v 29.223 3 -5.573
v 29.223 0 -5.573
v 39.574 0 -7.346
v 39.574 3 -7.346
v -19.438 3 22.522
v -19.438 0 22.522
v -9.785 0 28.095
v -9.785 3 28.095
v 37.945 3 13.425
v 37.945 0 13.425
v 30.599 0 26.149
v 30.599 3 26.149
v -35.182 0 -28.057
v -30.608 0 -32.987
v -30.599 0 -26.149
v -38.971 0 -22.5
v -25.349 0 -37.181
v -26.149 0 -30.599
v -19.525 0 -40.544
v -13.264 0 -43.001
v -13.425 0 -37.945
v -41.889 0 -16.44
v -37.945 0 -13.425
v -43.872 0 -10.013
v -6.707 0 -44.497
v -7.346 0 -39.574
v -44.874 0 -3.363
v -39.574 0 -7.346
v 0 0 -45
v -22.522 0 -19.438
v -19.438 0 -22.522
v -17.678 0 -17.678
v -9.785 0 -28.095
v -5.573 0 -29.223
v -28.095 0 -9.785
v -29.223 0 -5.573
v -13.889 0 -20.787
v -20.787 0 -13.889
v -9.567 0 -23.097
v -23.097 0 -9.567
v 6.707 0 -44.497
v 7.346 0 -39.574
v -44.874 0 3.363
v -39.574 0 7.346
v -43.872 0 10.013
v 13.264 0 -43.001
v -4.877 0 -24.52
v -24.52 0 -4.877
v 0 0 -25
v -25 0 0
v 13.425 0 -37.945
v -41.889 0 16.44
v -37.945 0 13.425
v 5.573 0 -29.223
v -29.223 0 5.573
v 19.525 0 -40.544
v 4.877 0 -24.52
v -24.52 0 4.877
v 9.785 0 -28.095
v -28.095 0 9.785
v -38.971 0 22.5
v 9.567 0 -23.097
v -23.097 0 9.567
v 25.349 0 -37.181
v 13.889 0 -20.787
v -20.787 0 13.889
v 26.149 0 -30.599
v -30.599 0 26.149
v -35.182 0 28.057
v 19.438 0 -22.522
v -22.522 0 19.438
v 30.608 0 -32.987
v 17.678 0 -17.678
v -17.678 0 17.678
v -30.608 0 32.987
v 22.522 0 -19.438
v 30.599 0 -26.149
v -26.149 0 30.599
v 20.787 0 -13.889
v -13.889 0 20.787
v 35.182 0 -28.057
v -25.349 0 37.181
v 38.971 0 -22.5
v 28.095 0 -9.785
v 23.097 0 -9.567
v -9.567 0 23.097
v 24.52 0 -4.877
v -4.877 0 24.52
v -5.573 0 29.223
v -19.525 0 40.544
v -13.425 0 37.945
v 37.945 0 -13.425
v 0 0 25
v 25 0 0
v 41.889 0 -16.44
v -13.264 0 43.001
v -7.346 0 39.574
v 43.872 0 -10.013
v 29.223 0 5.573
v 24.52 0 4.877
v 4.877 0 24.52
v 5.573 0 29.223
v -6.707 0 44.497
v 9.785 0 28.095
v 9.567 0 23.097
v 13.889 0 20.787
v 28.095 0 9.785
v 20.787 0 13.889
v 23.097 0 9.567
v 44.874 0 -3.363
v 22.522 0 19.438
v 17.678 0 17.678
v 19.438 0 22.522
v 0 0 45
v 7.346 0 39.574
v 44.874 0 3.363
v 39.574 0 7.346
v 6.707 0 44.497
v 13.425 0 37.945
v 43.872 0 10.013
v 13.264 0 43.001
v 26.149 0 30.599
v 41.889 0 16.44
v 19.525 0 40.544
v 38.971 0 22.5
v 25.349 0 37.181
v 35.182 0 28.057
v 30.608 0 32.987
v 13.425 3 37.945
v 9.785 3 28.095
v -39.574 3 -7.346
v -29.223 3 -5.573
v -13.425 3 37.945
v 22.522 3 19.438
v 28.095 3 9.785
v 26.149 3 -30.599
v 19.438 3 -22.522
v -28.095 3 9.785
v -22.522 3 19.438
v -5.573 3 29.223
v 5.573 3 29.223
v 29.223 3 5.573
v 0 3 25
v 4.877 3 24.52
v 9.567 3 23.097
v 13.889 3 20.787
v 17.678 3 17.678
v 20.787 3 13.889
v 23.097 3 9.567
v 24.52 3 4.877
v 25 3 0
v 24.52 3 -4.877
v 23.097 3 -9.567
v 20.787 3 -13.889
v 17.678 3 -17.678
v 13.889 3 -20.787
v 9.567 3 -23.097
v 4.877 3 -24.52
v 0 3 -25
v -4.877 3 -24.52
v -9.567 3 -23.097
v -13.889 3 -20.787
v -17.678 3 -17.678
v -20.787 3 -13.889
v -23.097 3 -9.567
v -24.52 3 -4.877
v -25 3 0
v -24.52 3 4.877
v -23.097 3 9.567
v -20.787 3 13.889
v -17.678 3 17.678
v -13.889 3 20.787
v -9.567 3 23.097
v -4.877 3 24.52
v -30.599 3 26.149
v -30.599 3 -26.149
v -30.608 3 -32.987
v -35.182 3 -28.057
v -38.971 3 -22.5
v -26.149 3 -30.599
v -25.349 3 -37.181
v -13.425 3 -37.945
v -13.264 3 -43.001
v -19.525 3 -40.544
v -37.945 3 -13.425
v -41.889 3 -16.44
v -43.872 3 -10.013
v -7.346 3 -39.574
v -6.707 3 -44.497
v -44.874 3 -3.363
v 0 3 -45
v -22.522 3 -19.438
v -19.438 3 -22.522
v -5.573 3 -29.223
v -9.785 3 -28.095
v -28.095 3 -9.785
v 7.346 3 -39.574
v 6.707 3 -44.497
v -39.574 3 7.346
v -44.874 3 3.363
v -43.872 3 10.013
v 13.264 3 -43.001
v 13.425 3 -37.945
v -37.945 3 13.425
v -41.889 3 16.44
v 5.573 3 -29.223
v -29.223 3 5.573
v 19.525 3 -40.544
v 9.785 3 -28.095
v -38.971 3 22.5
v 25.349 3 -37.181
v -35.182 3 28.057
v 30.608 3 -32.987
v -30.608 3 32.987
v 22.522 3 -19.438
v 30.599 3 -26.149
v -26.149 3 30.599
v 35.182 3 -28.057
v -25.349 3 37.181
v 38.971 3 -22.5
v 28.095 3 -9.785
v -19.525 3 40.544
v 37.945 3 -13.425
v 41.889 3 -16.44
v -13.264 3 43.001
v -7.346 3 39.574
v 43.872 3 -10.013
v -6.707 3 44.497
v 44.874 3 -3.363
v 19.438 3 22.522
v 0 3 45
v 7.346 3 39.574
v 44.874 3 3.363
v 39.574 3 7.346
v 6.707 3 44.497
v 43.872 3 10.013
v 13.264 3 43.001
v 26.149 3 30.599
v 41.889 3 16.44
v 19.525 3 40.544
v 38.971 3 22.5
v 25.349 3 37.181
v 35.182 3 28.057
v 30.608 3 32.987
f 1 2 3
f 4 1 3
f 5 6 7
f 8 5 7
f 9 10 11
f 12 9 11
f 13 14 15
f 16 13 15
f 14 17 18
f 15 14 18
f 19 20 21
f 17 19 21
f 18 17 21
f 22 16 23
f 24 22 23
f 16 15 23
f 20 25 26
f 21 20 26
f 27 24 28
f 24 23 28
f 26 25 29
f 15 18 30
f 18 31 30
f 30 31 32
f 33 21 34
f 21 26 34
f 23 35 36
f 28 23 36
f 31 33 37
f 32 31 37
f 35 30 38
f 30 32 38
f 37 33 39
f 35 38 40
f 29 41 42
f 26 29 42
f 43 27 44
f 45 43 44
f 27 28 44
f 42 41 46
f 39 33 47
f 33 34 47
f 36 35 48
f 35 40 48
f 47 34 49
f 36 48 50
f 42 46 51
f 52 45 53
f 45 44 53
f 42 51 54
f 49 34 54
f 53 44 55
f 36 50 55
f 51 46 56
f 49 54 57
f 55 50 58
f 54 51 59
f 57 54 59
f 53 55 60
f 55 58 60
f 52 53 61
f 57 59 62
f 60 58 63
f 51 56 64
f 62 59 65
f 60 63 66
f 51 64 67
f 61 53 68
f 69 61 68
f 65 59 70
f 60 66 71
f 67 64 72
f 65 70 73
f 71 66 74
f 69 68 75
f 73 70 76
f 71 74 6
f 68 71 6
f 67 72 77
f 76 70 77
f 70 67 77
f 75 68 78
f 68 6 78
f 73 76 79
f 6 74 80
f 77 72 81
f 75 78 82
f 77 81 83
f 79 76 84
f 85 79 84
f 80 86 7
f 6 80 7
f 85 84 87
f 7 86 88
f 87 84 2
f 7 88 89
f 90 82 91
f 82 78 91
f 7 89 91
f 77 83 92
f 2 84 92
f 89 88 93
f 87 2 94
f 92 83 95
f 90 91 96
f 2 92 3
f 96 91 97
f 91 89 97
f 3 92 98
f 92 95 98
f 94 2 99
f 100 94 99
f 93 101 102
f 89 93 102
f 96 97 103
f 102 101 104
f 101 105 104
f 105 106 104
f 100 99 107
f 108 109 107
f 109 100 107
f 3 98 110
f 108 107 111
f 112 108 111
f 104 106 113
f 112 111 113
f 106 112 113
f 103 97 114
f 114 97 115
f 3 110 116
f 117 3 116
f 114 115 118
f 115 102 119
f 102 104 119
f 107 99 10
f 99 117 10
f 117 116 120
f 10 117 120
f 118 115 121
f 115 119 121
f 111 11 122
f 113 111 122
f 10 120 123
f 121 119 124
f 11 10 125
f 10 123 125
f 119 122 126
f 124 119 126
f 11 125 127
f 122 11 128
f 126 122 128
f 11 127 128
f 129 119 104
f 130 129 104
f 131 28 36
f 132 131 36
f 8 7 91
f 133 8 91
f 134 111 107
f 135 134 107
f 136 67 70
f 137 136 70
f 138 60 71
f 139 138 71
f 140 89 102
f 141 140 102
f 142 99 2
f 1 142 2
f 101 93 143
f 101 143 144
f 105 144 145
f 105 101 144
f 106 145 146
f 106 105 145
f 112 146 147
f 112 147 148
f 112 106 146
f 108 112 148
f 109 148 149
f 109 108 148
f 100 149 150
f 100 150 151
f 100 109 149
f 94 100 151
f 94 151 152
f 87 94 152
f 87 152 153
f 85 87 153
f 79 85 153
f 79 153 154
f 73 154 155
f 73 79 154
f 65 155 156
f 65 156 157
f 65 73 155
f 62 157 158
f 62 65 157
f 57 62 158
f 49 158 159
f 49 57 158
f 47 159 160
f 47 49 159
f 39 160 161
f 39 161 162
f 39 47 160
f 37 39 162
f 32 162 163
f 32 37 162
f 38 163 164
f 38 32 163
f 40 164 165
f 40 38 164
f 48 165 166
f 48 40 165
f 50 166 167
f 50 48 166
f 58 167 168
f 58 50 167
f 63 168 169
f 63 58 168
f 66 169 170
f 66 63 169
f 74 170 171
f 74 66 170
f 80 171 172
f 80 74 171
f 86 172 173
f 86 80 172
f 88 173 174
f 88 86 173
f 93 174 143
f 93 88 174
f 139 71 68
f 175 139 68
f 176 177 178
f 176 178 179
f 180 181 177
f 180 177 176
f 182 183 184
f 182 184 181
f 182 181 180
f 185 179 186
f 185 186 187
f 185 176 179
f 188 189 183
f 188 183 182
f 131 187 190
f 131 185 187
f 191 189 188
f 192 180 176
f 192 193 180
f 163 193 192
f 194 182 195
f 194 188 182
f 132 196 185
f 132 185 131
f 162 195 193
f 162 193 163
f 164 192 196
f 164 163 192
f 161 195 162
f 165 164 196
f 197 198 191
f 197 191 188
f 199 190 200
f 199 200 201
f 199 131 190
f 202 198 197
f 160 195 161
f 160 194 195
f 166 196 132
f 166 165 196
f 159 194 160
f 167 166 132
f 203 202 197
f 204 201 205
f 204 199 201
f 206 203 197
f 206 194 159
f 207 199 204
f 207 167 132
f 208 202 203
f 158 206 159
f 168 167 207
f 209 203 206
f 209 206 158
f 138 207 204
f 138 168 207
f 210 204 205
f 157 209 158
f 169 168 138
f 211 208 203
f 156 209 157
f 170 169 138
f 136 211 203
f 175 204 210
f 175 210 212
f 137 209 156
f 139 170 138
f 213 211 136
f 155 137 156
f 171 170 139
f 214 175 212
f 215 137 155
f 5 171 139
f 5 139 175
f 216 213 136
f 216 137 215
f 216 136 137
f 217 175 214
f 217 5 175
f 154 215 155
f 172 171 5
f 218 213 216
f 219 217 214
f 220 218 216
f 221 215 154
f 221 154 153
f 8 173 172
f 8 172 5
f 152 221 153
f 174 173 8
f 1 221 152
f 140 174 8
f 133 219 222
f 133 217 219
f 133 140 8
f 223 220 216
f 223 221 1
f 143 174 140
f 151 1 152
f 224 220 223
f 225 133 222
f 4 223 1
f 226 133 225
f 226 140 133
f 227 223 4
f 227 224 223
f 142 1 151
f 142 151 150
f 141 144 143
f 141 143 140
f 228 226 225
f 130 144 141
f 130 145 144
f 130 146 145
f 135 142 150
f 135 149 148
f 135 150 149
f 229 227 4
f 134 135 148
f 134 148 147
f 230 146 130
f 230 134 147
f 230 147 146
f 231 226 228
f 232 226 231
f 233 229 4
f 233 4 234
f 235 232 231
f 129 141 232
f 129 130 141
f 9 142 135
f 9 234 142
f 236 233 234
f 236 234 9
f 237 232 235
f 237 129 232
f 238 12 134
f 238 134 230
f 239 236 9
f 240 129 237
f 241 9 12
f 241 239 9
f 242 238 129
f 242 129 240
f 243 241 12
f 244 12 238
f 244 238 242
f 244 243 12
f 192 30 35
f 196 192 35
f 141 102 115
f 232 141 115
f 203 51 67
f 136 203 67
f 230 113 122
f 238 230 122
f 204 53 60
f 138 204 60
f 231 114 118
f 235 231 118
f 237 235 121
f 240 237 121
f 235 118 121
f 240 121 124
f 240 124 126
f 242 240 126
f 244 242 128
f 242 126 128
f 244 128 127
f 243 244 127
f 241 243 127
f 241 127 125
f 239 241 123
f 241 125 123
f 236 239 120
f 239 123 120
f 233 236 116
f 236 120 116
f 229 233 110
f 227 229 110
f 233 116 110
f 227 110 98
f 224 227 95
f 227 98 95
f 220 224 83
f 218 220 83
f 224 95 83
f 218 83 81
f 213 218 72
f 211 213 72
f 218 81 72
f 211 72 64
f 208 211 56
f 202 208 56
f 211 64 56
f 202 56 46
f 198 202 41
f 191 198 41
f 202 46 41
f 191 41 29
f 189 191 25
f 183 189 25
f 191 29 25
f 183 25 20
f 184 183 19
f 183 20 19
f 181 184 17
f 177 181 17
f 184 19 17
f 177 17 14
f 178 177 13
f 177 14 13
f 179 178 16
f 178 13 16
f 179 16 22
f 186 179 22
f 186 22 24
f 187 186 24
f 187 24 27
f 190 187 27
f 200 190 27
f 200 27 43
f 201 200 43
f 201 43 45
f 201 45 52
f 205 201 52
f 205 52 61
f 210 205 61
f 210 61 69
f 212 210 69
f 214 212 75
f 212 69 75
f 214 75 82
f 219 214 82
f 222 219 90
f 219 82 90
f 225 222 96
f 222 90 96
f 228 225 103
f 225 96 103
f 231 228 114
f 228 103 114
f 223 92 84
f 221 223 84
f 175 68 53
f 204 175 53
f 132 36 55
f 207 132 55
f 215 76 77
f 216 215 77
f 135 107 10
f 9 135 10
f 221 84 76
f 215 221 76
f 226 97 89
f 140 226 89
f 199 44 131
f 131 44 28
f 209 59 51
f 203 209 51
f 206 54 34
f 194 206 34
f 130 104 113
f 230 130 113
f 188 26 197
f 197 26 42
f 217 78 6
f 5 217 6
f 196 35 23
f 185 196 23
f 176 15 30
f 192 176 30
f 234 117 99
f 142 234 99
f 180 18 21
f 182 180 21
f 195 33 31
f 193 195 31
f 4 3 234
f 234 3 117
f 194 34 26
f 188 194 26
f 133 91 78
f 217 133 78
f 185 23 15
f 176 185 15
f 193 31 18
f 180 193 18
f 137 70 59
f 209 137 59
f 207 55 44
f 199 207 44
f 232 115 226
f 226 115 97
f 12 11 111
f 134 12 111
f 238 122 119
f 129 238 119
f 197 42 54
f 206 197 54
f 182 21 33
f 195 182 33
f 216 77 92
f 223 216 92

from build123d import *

# Parameters (mm, degrees)
SKETCH1_R           = 45
SKETCH1_R_2         = 25
BOSS_EXTRUDE1_DEPTH = 3


with BuildPart() as part:
    # Sketch1 → Boss-Extrude1 (new body)
    with BuildSketch(Plane(origin=(0, 0, 0), x_dir=(1, 0, 0), z_dir=(0, 1, 0))):
        with Locations(Location((0, 0, 0), (0, 0, 270))):
            Circle(SKETCH1_R)
        with Locations(Location((0, 0, 0), (0, 0, 270))):
            Circle(SKETCH1_R_2, mode=Mode.SUBTRACT)
        Polygon((-7.346, 39.573965988), (7.346, 39.573965988), (5.573, 29.223349757), (-5.573, 29.223349757), align=None, mode=Mode.SUBTRACT)
        Polygon((9.785315303, 28.094663273), (13.425160378, 37.945059874), (26.14880561, 30.599059874), (19.438034454, 22.521663273), align=None, mode=Mode.SUBTRACT)
        Polygon((22.521663273, 19.438034454), (30.599059874, 26.14880561), (37.945059874, 13.425160378), (28.094663273, 9.785315303), align=None, mode=Mode.SUBTRACT)
        Polygon((29.223349757, 5.573), (39.573965988, 7.346), (39.573965988, -7.346), (29.223349757, -5.573), align=None, mode=Mode.SUBTRACT)
        Polygon((28.094663273, -9.785315303), (37.945059874, -13.425160378), (30.599059874, -26.14880561), (22.521663273, -19.438034454), align=None, mode=Mode.SUBTRACT)
        Polygon((19.438034454, -22.521663273), (26.14880561, -30.599059874), (13.425160378, -37.945059874), (9.785315303, -28.094663273), align=None, mode=Mode.SUBTRACT)
        Polygon((5.573, -29.223349757), (7.346, -39.573965988), (-7.346, -39.573965988), (-5.573, -29.223349757), align=None, mode=Mode.SUBTRACT)
        Polygon((-9.785315303, -28.094663273), (-13.425160378, -37.945059874), (-26.14880561, -30.599059874), (-19.438034454, -22.521663273), align=None, mode=Mode.SUBTRACT)
        Polygon((-22.521663273, -19.438034454), (-30.599059874, -26.14880561), (-37.945059874, -13.425160378), (-28.094663273, -9.785315303), align=None, mode=Mode.SUBTRACT)
        Polygon((-29.223349757, -5.573), (-39.573965988, -7.346), (-39.573965988, 7.346), (-29.223349757, 5.573), align=None, mode=Mode.SUBTRACT)
        Polygon((-28.094663273, 9.785315303), (-37.945059874, 13.425160378), (-30.599059874, 26.14880561), (-22.521663273, 19.438034454), align=None, mode=Mode.SUBTRACT)
        Polygon((-19.438034454, 22.521663273), (-26.14880561, 30.599059874), (-13.425160378, 37.945059874), (-9.785315303, 28.094663273), align=None, mode=Mode.SUBTRACT)
    extrude(amount=BOSS_EXTRUDE1_DEPTH)


solid = part.part
